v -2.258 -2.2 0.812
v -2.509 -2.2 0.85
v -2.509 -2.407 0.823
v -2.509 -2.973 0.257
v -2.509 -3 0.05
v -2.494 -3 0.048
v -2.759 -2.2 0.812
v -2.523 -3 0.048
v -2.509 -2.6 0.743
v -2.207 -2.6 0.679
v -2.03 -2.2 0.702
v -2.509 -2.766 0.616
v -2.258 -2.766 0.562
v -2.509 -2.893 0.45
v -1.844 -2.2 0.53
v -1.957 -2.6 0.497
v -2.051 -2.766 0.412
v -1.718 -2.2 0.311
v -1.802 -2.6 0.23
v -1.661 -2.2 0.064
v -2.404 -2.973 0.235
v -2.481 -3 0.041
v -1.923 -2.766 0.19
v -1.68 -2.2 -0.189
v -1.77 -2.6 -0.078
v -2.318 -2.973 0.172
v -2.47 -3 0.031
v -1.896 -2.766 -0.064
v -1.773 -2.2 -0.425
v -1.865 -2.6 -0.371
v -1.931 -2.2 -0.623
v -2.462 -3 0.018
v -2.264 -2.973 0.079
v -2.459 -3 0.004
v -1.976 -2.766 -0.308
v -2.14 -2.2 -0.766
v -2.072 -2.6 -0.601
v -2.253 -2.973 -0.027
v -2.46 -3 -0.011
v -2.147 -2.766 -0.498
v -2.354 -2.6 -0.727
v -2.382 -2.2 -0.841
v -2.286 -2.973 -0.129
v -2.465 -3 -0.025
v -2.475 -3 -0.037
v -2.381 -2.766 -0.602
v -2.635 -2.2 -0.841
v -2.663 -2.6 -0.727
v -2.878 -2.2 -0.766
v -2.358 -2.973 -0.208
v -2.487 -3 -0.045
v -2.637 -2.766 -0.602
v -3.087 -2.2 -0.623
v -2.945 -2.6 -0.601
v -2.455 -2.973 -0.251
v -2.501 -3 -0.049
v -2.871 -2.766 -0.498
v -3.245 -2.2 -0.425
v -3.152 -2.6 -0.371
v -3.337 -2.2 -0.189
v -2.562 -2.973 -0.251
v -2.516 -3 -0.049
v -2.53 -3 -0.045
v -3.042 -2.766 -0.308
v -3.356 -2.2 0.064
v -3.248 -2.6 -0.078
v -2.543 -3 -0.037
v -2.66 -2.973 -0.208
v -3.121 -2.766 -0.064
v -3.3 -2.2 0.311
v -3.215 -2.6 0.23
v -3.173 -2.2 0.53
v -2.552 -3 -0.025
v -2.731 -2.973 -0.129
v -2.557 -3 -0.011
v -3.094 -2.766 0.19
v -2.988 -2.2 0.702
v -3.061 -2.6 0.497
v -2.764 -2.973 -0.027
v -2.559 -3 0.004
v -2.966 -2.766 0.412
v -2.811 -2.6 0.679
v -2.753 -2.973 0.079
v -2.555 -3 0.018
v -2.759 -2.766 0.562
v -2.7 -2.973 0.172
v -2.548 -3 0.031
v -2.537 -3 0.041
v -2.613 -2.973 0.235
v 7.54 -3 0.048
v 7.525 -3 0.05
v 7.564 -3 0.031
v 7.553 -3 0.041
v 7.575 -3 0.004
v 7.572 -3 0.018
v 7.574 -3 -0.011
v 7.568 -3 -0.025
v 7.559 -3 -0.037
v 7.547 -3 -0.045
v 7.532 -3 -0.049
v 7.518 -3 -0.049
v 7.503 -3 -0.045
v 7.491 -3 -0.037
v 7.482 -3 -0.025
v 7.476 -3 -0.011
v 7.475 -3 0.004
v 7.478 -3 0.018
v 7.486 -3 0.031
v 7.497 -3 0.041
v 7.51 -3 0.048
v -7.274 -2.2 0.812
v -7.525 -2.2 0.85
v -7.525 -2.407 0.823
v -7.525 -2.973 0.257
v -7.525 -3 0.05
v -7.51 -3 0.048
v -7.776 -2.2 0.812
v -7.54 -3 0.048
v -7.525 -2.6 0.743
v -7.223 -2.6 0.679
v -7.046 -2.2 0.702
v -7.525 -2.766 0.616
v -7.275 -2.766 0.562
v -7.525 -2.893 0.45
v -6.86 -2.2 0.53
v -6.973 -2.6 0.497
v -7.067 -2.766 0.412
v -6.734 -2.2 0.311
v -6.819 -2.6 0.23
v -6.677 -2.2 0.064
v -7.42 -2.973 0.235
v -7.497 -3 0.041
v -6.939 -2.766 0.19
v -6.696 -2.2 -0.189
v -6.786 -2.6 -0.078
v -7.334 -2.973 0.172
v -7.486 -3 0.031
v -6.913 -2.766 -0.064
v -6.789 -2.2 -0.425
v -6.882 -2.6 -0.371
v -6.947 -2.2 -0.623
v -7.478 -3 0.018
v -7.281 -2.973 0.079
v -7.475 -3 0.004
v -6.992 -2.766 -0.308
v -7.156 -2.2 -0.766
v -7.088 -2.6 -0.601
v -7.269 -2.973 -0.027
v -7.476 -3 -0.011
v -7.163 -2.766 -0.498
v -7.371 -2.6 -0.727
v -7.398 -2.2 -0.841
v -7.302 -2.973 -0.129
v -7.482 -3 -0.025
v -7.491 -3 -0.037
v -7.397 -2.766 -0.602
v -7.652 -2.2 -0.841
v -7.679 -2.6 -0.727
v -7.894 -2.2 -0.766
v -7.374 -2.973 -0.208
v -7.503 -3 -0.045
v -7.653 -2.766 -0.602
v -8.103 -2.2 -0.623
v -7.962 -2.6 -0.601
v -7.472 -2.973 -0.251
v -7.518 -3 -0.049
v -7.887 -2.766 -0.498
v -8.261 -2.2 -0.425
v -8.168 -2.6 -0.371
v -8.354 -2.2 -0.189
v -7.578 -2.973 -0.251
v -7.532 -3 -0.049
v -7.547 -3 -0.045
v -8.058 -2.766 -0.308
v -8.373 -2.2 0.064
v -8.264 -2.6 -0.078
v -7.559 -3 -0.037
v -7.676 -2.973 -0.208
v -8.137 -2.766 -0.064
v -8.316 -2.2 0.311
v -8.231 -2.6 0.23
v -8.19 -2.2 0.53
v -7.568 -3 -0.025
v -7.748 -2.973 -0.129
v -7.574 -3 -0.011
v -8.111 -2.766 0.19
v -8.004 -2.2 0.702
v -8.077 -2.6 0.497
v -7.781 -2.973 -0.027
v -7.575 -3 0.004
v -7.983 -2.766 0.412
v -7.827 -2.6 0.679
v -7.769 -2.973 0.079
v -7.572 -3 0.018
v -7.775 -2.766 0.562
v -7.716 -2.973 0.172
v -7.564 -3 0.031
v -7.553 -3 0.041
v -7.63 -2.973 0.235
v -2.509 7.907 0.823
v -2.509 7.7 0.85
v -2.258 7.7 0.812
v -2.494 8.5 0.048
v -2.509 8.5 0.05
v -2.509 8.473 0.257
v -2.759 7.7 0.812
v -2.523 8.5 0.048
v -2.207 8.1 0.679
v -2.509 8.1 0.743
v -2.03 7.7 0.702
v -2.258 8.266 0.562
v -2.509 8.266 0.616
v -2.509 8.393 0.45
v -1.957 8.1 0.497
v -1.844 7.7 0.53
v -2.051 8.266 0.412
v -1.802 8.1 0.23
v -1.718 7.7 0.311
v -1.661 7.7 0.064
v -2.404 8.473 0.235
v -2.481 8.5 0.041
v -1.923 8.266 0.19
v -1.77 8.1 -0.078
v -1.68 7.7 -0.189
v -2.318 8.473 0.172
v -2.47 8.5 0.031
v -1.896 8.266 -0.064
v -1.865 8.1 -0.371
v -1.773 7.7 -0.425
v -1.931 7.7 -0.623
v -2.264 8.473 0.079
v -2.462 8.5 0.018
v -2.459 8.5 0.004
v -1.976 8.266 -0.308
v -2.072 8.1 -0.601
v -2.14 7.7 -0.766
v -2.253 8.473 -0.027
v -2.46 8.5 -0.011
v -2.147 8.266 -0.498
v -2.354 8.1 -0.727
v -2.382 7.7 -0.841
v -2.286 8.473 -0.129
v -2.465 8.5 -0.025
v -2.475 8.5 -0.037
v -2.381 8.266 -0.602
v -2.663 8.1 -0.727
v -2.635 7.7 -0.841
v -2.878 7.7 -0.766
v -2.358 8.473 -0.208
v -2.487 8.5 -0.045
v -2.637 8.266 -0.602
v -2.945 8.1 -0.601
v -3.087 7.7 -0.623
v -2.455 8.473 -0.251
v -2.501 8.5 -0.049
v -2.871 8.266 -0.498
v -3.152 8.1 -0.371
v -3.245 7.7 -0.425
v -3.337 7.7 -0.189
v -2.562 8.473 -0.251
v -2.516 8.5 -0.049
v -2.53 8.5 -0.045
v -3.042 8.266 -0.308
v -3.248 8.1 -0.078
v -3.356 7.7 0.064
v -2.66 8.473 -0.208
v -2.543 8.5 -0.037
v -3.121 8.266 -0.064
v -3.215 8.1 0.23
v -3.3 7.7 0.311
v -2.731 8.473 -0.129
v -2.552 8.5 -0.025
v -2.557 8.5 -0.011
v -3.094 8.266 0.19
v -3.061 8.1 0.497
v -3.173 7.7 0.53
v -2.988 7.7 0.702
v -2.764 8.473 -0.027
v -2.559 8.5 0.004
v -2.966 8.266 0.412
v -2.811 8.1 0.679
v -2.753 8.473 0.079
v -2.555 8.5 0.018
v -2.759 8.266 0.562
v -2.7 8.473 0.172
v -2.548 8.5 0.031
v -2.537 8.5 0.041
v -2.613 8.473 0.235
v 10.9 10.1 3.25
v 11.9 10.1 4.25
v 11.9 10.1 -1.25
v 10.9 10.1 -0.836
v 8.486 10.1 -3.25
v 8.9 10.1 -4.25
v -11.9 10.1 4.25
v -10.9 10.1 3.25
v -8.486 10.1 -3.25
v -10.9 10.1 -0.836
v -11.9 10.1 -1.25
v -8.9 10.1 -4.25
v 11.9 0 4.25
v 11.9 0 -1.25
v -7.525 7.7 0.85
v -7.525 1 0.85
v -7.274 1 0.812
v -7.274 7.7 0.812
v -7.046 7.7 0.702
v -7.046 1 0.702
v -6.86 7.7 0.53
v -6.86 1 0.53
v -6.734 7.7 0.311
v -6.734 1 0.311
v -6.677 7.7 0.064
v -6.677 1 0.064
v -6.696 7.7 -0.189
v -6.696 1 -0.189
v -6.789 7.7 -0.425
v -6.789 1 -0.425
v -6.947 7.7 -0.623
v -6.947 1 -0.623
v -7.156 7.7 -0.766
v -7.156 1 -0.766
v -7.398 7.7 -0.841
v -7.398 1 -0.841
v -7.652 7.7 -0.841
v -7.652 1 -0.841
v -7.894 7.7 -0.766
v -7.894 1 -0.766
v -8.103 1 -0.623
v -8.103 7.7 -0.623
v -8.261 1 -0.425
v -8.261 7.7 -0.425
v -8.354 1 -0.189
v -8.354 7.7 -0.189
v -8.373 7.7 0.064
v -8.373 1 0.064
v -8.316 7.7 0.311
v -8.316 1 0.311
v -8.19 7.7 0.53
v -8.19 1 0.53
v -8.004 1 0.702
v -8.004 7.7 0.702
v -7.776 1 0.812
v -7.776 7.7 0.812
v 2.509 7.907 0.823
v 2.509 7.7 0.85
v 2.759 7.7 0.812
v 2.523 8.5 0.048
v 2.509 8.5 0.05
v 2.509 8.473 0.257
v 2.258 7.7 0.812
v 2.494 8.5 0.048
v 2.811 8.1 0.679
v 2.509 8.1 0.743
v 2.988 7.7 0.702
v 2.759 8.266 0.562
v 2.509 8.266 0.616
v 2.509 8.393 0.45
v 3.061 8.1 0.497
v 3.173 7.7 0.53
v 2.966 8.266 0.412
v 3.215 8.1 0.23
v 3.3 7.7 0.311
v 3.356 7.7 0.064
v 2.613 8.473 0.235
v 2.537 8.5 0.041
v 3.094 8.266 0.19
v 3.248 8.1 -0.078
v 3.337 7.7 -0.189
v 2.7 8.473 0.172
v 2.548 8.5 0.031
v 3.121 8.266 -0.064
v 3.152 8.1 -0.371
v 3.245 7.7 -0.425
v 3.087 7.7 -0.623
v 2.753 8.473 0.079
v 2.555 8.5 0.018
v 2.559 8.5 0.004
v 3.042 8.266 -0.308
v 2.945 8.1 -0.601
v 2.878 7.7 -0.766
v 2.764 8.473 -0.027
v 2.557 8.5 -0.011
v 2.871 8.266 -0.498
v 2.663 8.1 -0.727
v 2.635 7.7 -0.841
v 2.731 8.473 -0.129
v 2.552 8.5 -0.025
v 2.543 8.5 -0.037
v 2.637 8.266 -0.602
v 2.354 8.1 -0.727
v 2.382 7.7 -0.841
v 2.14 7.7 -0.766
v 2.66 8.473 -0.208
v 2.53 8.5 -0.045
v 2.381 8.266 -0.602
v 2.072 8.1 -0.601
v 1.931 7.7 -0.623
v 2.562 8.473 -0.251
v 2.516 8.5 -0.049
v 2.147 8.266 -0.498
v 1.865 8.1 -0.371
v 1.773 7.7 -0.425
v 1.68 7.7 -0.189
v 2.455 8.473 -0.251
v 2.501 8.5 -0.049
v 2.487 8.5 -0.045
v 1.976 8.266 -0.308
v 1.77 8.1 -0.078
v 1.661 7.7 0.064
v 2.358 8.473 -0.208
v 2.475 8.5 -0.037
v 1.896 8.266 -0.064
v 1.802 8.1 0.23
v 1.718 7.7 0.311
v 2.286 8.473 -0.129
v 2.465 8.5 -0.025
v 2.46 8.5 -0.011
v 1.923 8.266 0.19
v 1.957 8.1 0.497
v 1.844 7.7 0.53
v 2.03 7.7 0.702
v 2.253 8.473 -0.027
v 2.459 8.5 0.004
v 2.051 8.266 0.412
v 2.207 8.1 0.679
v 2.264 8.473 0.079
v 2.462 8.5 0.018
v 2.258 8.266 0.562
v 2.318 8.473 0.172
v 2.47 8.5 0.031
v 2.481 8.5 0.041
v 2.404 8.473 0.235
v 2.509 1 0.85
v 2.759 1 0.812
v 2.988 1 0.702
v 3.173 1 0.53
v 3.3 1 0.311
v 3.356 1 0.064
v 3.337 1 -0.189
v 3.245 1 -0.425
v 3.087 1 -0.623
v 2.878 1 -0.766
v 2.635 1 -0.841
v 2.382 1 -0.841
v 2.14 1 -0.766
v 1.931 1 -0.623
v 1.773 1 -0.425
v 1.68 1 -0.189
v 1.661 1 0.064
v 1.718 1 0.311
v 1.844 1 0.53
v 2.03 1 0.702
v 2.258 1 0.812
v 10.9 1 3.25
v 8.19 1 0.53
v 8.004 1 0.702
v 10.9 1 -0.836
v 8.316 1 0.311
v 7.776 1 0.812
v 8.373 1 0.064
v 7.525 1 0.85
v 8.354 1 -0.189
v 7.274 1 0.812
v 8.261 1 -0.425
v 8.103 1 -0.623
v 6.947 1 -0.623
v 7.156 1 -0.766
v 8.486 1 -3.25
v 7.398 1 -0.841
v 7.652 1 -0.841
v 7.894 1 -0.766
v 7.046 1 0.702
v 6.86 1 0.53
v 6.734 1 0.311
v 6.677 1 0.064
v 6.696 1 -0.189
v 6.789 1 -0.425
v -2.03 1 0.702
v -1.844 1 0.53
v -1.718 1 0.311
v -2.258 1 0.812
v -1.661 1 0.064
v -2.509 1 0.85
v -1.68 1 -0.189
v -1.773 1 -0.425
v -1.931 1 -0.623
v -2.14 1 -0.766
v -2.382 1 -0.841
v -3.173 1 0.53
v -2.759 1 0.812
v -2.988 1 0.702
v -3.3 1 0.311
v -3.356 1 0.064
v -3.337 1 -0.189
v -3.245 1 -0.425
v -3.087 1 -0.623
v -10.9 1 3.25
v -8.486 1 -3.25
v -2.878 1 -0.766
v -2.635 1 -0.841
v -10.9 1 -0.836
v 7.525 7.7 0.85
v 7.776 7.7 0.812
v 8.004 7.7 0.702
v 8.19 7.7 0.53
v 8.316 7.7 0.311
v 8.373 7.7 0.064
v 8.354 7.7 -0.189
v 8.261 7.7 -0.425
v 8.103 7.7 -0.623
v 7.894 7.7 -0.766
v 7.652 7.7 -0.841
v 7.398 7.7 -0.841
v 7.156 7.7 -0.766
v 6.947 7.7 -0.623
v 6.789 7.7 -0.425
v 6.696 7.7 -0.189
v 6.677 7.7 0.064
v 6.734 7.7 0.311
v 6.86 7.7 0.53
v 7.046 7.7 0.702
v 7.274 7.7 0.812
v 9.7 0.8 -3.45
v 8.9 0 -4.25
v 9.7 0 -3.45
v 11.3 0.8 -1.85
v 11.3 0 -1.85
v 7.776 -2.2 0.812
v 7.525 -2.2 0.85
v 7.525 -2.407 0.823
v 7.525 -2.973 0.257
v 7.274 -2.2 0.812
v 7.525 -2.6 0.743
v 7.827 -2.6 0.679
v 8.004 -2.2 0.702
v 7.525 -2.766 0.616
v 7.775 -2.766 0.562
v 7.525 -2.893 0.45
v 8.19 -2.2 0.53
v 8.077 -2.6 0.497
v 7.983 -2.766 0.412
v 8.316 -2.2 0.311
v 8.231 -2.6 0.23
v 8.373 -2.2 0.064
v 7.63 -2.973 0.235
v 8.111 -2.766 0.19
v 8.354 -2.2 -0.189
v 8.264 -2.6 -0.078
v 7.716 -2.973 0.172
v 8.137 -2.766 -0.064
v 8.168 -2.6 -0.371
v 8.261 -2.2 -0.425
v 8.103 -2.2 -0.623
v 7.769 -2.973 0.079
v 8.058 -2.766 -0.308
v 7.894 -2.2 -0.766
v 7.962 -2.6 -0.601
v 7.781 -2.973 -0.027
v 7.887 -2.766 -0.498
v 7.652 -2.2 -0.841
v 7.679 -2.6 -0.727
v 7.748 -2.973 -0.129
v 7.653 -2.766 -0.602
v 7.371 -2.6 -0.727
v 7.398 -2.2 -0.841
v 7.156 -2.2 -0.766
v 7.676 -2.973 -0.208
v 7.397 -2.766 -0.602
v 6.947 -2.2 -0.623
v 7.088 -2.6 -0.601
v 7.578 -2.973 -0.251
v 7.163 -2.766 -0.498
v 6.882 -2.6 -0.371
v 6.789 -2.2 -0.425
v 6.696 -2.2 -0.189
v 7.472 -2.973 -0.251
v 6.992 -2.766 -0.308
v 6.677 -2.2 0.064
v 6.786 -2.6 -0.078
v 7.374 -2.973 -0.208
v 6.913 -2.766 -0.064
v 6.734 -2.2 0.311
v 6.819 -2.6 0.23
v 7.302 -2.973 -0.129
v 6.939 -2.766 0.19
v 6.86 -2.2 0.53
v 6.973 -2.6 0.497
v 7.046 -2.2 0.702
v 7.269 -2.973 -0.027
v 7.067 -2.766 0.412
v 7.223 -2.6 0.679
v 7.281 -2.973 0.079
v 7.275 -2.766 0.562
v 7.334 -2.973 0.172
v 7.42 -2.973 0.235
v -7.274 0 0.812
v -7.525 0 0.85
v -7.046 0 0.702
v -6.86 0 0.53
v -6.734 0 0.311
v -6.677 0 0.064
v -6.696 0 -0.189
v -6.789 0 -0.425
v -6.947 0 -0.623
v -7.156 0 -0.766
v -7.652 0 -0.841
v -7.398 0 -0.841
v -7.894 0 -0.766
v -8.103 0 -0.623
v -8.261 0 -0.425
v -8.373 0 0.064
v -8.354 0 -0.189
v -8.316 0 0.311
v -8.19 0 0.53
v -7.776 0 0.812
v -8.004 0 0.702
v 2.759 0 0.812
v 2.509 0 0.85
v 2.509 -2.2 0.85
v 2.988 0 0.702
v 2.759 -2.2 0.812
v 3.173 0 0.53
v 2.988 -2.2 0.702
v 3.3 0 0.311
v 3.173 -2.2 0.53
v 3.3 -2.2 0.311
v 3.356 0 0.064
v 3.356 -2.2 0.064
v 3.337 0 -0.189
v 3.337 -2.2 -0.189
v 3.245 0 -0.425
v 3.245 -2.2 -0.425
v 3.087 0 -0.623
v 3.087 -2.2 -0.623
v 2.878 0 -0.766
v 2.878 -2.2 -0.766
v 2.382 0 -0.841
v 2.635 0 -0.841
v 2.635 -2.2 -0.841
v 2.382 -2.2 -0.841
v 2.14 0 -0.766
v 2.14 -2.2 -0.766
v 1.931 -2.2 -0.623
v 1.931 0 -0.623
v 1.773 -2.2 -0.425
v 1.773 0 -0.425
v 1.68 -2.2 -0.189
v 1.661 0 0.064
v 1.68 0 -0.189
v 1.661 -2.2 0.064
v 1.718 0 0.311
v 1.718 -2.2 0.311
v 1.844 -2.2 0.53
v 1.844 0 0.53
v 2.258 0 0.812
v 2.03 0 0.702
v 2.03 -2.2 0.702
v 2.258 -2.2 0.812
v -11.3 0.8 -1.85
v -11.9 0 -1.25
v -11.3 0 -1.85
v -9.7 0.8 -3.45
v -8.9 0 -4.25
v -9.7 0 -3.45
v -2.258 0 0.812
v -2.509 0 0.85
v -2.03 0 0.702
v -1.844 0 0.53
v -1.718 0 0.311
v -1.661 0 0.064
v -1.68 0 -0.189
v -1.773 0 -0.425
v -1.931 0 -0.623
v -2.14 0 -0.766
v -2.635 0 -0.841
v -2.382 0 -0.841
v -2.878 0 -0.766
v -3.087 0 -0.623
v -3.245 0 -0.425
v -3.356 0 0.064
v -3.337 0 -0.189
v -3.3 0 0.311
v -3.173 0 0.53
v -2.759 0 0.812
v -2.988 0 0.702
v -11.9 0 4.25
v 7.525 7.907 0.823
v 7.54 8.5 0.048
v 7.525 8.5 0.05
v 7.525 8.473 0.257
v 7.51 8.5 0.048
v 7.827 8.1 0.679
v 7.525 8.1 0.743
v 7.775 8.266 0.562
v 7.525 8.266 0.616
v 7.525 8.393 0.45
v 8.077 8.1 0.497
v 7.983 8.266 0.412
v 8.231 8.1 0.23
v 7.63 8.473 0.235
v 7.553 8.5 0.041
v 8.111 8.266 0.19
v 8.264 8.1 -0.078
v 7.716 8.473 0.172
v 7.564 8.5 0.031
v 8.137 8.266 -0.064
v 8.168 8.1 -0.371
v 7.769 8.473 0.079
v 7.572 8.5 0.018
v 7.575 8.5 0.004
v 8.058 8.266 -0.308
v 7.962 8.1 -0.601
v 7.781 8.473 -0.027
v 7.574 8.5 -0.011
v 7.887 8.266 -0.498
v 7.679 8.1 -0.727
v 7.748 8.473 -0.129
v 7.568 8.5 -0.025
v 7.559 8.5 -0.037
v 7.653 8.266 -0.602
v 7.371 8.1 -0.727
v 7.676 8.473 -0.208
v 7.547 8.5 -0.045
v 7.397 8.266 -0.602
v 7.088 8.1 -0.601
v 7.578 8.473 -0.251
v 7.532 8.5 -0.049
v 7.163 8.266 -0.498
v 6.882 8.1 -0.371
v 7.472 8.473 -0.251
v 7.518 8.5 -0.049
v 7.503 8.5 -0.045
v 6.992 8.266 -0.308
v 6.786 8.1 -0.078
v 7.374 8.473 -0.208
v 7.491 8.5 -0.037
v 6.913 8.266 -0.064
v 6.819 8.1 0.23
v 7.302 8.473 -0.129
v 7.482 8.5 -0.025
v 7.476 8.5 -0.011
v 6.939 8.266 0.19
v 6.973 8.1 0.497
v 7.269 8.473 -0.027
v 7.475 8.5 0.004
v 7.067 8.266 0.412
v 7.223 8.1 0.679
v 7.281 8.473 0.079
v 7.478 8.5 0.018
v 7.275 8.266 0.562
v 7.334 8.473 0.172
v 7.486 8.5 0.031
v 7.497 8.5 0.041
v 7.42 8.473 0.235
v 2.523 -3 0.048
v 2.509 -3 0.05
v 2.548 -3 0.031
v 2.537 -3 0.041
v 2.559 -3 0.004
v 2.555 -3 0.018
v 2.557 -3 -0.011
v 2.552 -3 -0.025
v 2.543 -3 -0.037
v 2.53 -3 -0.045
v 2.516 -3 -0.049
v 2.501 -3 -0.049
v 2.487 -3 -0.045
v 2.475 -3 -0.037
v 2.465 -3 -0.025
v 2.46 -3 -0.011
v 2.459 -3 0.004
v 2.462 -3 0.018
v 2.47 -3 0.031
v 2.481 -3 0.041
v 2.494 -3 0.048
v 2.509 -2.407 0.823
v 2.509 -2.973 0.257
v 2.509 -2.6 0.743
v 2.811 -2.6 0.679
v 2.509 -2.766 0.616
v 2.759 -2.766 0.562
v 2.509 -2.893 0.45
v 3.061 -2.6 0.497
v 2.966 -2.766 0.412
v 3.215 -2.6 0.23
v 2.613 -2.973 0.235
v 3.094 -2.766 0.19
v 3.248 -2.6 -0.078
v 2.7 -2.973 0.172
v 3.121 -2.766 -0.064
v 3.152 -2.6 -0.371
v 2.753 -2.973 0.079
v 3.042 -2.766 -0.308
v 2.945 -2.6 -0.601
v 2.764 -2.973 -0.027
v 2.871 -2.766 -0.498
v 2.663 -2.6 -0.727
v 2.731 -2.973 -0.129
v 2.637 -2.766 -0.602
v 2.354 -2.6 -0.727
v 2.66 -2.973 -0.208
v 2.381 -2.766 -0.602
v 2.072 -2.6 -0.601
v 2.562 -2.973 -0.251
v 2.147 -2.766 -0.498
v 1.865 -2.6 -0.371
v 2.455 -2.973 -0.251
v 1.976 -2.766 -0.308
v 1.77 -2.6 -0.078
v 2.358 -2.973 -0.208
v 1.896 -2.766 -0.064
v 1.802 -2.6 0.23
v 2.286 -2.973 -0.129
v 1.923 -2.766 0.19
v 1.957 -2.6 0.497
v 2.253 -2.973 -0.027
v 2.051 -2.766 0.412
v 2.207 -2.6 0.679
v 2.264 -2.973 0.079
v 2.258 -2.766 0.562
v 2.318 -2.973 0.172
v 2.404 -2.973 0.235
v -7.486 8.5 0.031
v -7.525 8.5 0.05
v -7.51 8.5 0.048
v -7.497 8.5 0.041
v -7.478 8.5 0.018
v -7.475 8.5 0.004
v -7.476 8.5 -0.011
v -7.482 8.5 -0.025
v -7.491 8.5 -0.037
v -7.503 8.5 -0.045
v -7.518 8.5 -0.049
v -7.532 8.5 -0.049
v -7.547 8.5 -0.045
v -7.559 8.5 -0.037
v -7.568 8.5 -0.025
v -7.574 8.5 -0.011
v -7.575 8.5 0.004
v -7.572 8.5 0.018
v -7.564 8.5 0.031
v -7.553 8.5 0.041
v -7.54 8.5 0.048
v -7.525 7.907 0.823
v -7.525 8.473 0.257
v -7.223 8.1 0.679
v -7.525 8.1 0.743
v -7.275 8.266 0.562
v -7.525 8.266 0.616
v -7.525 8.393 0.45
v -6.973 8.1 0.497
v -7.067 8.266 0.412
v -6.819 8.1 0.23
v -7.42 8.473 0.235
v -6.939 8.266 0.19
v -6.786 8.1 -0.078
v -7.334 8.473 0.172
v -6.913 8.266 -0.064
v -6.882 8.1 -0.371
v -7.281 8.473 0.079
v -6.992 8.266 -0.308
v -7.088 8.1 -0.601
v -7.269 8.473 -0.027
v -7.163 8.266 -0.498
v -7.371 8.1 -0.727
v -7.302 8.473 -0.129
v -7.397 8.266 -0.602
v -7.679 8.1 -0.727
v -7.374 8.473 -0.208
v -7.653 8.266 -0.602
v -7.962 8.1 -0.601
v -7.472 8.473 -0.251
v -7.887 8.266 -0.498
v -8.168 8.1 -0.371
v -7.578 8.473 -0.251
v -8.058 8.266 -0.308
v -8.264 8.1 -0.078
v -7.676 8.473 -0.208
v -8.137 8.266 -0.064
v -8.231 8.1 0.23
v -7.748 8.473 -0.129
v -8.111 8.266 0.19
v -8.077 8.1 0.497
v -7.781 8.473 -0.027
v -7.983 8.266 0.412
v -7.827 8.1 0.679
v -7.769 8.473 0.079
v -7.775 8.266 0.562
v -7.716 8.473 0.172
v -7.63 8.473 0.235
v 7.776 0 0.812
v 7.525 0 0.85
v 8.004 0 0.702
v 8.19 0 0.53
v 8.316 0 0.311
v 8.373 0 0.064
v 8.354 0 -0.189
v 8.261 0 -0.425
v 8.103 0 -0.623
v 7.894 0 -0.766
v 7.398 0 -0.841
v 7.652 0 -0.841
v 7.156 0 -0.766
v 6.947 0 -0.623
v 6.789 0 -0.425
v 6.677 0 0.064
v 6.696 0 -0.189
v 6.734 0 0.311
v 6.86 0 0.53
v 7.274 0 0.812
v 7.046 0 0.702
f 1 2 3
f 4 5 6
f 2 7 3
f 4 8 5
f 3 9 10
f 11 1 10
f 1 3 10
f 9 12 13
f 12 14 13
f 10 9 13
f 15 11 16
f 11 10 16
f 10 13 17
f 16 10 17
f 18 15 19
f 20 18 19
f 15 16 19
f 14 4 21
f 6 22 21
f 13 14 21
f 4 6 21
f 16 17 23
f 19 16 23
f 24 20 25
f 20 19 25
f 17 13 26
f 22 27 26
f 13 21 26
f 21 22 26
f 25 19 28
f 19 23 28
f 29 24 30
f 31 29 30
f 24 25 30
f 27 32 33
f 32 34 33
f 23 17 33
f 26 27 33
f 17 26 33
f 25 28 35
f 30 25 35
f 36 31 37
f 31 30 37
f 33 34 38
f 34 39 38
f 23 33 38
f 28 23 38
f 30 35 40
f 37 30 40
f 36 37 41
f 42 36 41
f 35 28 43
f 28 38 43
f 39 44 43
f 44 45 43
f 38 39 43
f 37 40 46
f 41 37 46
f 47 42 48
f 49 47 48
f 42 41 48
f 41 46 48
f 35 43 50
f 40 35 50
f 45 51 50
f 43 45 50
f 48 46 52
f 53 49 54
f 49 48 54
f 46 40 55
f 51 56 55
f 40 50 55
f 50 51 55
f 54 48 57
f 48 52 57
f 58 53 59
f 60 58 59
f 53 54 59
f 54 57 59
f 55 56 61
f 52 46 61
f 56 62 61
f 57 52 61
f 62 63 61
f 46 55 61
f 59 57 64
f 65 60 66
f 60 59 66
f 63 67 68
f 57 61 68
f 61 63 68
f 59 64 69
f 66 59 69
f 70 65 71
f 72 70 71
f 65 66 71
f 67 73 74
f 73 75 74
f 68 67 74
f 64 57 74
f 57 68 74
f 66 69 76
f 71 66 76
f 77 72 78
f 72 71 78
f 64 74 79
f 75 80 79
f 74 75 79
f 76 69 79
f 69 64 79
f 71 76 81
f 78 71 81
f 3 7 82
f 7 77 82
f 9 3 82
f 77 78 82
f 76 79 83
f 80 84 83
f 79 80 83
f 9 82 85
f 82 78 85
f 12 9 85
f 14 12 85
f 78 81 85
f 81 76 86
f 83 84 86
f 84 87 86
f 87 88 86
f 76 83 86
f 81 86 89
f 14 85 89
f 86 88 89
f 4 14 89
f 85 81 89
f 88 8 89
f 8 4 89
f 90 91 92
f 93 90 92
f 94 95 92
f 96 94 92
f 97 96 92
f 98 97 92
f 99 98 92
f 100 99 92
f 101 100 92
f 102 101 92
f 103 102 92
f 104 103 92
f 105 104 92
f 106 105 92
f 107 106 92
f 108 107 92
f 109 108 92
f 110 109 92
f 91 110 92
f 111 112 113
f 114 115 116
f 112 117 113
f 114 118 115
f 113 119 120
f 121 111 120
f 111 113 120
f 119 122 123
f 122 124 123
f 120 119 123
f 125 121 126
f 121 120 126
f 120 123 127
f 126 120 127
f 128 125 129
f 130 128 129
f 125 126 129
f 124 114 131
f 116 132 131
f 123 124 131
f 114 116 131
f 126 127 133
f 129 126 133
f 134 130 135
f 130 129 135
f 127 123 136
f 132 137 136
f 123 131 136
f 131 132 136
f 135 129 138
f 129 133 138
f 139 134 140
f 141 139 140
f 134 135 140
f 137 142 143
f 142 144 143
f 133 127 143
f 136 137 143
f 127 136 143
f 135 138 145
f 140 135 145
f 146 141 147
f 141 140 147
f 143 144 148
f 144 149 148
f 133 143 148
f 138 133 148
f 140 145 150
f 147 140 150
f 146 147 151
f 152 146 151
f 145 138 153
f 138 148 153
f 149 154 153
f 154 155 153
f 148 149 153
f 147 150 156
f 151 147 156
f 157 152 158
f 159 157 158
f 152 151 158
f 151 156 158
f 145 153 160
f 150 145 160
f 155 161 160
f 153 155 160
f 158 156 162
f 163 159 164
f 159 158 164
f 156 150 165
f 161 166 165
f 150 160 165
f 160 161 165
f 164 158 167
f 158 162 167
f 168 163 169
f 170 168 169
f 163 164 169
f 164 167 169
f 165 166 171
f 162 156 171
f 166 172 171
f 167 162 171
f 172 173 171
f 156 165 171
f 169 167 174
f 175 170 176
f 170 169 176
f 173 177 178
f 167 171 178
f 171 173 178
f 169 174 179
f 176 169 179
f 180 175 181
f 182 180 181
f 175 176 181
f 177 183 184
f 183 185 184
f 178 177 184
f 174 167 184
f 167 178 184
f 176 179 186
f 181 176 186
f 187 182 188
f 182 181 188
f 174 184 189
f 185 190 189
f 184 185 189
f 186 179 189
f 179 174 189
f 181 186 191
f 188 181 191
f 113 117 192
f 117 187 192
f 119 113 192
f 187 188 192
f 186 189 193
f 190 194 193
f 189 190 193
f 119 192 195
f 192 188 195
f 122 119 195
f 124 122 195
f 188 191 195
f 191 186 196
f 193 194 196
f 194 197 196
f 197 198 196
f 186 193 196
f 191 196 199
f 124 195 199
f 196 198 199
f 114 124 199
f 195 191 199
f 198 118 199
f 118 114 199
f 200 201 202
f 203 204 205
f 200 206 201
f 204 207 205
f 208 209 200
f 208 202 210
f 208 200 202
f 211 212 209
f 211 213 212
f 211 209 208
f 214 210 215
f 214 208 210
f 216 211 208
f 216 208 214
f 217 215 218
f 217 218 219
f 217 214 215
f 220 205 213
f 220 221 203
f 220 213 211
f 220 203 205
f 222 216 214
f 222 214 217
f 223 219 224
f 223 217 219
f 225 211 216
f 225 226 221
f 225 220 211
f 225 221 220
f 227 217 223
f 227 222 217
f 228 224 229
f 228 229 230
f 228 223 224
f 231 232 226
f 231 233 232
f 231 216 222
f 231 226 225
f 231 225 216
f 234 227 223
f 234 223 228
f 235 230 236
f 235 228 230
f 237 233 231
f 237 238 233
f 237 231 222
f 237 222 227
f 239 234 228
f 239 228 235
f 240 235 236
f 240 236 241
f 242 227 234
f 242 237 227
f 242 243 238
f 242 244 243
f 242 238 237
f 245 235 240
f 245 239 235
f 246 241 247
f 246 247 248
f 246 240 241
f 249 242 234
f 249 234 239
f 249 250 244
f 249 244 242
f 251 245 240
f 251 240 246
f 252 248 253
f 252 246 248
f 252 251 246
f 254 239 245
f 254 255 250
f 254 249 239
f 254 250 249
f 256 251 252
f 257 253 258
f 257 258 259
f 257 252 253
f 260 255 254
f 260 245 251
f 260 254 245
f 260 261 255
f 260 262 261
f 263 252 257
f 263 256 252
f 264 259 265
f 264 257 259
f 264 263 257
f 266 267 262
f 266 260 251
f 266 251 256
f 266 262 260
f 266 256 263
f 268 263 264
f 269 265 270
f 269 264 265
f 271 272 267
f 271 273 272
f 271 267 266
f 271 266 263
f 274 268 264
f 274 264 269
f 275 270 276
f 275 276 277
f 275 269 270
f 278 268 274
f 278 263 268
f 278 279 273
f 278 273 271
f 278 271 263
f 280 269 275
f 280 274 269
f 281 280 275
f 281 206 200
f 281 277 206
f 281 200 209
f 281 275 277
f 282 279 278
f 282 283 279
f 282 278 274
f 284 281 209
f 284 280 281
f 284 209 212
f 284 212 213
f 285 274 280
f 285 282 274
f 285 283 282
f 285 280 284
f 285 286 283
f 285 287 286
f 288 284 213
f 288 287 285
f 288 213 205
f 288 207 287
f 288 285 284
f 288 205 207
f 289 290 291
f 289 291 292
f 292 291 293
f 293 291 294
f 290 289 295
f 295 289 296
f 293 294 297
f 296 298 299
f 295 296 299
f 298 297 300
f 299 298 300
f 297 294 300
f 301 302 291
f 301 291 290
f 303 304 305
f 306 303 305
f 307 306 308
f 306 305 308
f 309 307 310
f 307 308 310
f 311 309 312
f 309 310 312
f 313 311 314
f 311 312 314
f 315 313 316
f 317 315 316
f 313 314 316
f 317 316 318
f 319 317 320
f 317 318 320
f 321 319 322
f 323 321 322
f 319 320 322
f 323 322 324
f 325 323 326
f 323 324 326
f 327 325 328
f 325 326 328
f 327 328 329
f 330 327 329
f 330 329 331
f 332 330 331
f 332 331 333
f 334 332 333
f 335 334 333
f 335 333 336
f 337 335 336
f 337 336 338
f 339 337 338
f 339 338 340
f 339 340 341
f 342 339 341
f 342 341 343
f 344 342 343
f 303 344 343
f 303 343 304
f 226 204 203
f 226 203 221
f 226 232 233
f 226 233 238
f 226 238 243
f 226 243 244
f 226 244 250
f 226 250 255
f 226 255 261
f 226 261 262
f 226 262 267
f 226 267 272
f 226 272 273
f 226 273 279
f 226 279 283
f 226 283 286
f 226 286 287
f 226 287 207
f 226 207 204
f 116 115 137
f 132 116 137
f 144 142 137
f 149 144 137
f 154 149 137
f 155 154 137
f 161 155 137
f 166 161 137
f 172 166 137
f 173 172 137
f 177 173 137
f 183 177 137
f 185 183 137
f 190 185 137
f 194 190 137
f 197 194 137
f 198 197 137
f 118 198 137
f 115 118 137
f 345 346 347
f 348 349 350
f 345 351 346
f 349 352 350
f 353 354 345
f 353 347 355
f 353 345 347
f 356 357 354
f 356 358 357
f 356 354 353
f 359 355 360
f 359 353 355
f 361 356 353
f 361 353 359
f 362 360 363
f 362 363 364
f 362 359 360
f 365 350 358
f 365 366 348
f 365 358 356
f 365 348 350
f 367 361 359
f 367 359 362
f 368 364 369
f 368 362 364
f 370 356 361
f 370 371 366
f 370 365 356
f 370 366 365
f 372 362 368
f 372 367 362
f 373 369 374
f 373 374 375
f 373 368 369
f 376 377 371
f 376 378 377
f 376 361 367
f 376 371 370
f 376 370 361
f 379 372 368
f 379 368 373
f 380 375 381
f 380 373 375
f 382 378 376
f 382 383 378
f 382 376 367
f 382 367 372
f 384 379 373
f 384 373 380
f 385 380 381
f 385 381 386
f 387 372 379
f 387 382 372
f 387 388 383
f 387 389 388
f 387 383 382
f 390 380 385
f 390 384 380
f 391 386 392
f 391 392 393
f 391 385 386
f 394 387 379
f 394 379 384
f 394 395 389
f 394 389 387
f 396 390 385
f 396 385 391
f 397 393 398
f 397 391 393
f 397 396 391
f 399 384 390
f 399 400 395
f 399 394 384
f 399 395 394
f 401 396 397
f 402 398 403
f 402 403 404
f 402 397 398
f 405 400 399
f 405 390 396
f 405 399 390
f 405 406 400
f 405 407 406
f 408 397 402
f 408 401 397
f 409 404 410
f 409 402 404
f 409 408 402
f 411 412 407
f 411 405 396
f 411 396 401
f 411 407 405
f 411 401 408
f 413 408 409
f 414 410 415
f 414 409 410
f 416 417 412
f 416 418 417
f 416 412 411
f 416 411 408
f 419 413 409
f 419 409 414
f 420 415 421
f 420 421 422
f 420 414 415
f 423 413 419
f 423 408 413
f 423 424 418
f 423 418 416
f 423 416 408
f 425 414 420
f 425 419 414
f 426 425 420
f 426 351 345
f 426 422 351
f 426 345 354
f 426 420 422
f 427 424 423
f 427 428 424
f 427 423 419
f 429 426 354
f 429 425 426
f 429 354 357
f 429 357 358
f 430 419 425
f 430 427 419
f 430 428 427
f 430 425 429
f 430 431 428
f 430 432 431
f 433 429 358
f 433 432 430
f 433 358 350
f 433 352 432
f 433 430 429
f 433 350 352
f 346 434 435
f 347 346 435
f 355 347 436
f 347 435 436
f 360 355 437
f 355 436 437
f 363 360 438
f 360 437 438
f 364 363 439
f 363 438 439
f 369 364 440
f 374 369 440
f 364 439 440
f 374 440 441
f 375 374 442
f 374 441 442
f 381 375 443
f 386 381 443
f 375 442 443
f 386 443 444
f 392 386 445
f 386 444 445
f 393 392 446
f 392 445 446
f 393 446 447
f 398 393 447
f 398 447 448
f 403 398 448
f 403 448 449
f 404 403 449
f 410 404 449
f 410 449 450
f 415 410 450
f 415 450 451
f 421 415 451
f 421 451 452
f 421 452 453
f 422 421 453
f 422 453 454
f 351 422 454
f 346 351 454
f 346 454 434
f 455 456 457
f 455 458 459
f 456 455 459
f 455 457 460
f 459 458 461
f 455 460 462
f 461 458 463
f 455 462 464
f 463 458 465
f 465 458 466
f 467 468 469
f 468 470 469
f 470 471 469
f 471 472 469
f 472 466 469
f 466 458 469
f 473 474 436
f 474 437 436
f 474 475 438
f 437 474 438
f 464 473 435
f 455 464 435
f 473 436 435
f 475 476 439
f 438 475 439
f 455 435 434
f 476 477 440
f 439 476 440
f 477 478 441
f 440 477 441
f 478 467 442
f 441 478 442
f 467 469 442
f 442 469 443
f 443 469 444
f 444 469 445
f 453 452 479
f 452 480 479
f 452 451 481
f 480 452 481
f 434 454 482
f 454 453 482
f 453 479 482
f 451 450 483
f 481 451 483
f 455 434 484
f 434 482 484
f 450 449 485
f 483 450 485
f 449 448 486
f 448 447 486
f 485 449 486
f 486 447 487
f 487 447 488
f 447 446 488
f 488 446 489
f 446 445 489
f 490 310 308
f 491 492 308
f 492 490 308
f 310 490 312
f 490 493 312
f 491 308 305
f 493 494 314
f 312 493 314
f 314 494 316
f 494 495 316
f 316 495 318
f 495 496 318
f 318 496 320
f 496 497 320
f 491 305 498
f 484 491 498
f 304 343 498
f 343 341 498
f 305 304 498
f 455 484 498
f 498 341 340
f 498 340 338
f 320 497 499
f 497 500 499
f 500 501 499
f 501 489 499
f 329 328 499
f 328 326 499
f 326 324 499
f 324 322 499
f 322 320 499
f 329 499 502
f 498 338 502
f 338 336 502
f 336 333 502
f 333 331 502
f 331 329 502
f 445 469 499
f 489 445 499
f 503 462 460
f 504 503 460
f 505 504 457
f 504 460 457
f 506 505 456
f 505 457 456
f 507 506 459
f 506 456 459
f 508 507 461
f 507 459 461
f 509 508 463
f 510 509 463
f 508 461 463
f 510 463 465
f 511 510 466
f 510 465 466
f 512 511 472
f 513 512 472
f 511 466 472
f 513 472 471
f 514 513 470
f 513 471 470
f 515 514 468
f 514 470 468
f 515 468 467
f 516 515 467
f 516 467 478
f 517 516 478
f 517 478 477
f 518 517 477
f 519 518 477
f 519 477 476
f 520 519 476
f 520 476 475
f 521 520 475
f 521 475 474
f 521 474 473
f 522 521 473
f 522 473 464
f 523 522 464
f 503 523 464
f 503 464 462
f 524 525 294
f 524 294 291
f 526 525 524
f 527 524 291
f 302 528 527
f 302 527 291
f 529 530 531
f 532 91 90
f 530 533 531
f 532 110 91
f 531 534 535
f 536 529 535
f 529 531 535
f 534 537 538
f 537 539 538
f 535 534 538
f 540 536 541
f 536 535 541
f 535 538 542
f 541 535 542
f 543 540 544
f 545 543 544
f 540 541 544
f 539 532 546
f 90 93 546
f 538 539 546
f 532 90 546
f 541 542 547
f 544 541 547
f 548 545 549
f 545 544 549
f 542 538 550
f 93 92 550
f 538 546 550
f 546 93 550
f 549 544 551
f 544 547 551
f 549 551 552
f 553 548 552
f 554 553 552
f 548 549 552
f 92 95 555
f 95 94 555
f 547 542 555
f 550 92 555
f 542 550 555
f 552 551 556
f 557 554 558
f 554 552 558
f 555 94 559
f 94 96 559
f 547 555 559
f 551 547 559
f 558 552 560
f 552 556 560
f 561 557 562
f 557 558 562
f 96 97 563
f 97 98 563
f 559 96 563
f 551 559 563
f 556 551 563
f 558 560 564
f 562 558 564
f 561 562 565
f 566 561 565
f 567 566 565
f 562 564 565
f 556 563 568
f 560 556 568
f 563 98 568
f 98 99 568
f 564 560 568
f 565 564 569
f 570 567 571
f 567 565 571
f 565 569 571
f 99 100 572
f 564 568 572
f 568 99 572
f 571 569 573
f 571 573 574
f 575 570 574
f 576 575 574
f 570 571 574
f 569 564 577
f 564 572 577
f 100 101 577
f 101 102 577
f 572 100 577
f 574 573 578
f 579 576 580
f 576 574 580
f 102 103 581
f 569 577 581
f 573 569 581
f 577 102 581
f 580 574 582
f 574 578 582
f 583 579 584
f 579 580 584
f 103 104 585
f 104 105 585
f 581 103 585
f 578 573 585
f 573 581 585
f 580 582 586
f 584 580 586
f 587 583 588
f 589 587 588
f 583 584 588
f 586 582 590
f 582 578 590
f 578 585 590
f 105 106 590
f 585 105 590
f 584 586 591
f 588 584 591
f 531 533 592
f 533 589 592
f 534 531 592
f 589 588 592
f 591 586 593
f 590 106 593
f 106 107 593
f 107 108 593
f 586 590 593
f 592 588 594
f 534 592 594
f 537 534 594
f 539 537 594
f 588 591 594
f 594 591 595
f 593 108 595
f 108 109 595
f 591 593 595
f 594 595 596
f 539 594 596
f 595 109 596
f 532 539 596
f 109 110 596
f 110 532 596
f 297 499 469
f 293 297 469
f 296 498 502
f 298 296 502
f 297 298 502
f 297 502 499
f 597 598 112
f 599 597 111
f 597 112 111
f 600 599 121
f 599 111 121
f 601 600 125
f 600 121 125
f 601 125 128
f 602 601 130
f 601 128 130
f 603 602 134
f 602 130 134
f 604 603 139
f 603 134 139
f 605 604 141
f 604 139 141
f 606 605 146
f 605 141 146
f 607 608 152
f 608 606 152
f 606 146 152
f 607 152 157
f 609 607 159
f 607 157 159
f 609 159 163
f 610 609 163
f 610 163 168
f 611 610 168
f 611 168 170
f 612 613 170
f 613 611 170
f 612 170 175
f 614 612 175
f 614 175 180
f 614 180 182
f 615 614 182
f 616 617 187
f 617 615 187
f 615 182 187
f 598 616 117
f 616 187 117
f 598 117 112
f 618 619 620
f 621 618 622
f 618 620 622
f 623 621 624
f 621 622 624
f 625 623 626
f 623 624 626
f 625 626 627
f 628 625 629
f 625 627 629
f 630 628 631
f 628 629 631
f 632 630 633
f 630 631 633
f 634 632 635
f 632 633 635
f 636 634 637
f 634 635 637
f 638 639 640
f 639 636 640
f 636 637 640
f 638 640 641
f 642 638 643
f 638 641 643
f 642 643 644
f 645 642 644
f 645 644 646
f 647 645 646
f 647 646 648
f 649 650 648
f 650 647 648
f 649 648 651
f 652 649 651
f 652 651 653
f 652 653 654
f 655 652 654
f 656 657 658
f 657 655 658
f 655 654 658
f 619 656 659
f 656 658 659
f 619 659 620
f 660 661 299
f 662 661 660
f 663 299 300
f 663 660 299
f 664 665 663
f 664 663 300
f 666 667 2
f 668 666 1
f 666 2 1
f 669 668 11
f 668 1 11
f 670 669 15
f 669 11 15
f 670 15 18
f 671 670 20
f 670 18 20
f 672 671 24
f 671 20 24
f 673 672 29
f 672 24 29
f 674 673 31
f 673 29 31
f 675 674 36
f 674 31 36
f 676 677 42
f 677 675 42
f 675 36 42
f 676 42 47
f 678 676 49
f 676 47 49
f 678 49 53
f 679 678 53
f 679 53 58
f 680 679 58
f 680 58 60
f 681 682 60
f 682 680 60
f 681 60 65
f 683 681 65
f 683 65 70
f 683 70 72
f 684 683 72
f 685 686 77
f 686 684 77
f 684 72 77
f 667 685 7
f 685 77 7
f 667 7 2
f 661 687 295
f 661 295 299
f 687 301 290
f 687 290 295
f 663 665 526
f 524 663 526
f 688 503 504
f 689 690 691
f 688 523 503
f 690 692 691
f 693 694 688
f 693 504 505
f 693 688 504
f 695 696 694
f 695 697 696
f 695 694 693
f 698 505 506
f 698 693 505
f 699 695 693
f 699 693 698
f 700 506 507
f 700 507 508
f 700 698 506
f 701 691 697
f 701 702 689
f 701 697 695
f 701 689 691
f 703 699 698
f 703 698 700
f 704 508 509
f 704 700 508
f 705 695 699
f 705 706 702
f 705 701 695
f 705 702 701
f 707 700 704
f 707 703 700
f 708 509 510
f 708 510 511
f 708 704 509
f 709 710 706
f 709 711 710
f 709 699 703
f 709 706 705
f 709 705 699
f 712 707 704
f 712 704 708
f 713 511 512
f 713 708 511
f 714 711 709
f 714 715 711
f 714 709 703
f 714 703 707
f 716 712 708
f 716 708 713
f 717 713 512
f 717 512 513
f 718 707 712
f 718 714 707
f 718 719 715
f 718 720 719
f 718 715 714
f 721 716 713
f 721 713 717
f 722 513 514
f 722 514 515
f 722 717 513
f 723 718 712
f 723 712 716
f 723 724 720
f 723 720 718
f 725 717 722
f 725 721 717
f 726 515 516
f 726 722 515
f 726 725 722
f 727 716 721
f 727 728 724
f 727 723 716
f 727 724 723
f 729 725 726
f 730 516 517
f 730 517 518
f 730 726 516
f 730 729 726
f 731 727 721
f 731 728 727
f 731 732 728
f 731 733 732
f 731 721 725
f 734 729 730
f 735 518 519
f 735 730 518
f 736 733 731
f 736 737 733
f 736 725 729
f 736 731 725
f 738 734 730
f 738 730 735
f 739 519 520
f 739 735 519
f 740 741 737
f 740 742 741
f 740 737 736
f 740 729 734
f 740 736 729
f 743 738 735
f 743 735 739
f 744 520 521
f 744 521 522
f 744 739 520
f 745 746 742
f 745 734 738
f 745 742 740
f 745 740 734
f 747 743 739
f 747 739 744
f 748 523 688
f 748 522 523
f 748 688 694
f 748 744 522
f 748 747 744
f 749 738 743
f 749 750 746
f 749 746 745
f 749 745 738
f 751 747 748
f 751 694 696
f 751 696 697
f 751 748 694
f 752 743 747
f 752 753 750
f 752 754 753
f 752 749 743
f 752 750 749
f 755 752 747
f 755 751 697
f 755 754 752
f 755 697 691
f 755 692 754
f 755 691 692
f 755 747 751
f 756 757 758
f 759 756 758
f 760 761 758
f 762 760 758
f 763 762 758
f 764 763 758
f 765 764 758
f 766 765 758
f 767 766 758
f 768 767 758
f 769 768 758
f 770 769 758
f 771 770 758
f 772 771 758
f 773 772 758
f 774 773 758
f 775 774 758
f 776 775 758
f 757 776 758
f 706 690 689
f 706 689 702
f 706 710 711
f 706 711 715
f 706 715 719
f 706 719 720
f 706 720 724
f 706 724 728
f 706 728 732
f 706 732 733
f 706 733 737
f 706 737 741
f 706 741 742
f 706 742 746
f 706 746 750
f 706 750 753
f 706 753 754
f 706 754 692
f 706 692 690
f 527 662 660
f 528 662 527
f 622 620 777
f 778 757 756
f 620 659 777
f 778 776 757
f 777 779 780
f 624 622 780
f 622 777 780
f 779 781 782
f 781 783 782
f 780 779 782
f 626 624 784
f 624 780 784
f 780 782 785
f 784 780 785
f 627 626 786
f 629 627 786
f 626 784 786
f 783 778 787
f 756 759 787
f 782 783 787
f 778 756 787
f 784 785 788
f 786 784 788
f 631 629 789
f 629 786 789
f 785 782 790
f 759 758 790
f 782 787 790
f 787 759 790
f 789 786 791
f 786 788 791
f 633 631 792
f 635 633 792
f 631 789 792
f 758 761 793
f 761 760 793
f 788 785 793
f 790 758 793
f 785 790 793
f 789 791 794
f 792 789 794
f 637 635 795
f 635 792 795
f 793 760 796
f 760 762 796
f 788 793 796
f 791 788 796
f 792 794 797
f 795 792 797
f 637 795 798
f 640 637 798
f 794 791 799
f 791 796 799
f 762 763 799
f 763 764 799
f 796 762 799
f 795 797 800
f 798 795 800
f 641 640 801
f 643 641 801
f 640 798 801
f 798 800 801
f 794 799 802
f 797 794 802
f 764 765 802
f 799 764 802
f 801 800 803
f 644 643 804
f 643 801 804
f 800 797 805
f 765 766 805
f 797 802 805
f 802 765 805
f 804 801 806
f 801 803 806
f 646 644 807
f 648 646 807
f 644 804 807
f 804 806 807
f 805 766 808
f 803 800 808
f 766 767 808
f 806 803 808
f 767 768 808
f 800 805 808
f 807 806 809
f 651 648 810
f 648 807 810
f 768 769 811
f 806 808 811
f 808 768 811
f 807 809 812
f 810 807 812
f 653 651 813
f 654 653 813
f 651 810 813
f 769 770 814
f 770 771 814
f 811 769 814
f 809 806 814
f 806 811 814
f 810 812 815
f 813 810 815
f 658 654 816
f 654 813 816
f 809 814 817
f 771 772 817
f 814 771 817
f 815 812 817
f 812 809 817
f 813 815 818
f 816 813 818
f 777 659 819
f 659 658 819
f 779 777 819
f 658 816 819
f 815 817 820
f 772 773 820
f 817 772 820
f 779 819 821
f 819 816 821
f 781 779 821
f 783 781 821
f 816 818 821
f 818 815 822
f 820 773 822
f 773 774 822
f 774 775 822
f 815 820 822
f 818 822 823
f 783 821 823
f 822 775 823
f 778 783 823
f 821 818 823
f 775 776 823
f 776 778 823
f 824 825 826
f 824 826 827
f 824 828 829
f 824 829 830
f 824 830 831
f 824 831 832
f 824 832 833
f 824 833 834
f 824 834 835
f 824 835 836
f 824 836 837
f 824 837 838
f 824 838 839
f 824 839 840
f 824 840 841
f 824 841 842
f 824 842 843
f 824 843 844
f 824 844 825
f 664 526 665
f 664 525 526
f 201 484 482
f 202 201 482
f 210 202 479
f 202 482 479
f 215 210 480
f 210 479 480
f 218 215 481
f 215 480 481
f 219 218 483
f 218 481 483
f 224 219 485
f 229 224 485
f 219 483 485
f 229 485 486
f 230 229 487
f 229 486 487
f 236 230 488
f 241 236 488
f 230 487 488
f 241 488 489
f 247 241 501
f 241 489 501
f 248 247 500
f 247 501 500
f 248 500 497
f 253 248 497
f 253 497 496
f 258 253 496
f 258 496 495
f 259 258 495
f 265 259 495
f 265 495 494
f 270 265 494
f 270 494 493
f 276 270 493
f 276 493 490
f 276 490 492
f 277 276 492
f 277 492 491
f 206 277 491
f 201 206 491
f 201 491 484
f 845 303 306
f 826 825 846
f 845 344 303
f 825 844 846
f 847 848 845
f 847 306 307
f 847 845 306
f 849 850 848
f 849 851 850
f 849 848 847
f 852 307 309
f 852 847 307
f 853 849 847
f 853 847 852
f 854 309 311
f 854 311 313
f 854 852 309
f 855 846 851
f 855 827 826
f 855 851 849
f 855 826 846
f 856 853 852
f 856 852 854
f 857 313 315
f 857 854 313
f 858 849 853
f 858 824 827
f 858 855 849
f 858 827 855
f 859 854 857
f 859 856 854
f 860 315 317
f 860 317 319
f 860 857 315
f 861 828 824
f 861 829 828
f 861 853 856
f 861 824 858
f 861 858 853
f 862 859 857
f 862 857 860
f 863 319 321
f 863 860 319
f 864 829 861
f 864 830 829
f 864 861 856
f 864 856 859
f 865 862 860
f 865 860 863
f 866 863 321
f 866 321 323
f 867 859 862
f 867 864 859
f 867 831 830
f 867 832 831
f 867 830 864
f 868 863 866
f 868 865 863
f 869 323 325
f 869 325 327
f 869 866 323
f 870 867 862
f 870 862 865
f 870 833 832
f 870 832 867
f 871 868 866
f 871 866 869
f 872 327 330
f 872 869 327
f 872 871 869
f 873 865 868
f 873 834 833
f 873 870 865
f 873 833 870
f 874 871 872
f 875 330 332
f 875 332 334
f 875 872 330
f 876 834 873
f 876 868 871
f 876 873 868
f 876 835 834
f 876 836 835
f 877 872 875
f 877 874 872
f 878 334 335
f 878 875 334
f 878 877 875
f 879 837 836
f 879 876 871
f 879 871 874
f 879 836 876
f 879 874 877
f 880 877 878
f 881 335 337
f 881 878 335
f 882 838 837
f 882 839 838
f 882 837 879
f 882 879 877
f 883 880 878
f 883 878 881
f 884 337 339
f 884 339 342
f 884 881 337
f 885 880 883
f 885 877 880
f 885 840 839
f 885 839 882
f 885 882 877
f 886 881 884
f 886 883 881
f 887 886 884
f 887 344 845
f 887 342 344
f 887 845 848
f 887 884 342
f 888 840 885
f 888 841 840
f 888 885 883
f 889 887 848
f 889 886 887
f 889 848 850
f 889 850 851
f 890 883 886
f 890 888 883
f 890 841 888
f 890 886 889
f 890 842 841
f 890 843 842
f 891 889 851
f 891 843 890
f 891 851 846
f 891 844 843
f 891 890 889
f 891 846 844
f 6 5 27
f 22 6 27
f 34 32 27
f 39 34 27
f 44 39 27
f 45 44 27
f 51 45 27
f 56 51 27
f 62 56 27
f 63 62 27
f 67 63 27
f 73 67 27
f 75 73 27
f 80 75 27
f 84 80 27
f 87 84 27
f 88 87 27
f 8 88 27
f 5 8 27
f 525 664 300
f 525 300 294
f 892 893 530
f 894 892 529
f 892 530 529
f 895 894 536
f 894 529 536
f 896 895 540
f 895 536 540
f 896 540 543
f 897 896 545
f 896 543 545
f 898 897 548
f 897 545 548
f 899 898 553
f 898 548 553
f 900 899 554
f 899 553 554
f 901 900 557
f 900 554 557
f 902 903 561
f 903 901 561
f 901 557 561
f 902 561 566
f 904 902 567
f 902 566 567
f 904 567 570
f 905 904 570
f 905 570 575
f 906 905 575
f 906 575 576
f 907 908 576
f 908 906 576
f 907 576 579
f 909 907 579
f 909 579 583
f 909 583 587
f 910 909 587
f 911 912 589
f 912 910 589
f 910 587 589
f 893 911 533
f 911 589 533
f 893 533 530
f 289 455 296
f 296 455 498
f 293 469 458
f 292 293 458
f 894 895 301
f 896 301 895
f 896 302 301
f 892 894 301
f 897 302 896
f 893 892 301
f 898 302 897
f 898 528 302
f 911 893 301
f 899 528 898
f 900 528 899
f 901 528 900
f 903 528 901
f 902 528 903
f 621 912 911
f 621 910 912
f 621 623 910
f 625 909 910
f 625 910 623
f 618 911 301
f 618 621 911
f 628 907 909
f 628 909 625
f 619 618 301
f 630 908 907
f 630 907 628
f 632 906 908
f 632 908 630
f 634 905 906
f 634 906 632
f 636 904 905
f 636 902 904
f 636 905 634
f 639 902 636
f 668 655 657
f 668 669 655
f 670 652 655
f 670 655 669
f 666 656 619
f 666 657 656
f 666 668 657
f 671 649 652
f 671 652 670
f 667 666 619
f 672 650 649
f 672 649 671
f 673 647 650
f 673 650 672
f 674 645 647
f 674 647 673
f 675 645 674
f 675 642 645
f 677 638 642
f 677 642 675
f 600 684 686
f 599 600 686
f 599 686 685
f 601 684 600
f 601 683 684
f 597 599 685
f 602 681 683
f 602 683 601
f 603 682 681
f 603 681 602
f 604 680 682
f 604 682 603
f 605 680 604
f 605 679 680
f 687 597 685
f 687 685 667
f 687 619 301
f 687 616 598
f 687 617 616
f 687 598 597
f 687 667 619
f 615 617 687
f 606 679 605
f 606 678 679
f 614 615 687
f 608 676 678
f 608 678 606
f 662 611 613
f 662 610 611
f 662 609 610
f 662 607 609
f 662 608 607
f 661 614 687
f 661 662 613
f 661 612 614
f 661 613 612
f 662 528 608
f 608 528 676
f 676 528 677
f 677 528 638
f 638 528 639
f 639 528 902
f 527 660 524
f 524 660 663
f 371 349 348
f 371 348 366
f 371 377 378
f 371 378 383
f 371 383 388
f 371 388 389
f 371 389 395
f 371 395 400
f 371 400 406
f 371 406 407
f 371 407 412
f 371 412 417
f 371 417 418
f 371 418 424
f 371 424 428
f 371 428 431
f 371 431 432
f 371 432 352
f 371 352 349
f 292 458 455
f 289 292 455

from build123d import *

# Parameters (mm, degrees)
BOSS_EXTRUDE1_DEPTH      = 10.1
SHELL1_T                 = -1
BOSS_EXTRUDE2_DEPTH      = 7.5
BOSS_EXTRUDE2_DEPTH_BACK = 4
SKETCH3_R                = 0.85
FILLET2_R                = 0.8
SKETCH4_W                = 26.621777211
SKETCH4_H                = 1.6
CUT_EXTRUDE1_DEPTH       = 0.8


with BuildPart() as part:
    # Sketch2 → Boss-Extrude1 (new body)
    with BuildSketch(Plane(origin=(0, 0, 0), x_dir=(1, 0, 0), z_dir=(0, 1, 0))):
        Polygon((-11.9, 1.25), (-8.9, 4.25), (8.9, 4.25), (11.9, 1.25), (11.9, -4.25), (-11.9, -4.25), align=None)
    extrude(amount=BOSS_EXTRUDE1_DEPTH)

    # Shell1
    shell1_openings = [part.faces().sort_by_distance(p)[0] for p in [
        (0, 10.1, 0.151319193),
    ]]
    offset(amount=SHELL1_T, openings=shell1_openings, kind=Kind.INTERSECTION)

    # Sketch3 → Boss-Extrude2 (add, two sides: drawn at the far end of the back side and taken through both)
    with BuildSketch(Plane(origin=(0, 1, 0), x_dir=(1, 0, 0), z_dir=(0, 1, 0)).offset(-BOSS_EXTRUDE2_DEPTH_BACK)):
        with Locations(Location((-7.525, 0, 0), (0, 0, 270))):
            Circle(SKETCH3_R)
        with Locations(Location((-2.50875, 0, 0), (0, 0, 270))):
            Circle(SKETCH3_R)
        with Locations(Location((7.525, 0, 0), (0, 0, 270))):
            Circle(SKETCH3_R)
        with Locations(Location((2.50875, 0, 0), (0, 0, 270))):
            Circle(SKETCH3_R)
    extrude(amount=BOSS_EXTRUDE2_DEPTH + BOSS_EXTRUDE2_DEPTH_BACK)

    # Fillet2
    fillet2_edges = [part.edges().sort_by_distance(p)[0] for p in [
        (-7.525, -3, -0.85),
        (-7.525, 8.5, -0.85),
        (-2.50875, -3, -0.85),
        (-2.50875, 8.5, -0.85),
        (7.525, -3, -0.85),
        (7.525, 8.5, -0.85),
        (2.50875, -3, -0.85),
        (2.50875, 8.5, -0.85),
    ]]
    fillet(fillet2_edges, radius=FILLET2_R)

    # Sketch4 → Cut-Extrude1 (cut)
    with BuildSketch(Plane.XZ):
        with Locations((1.142747193, -2.65)):
            Rectangle(SKETCH4_W, SKETCH4_H)
    extrude(amount=-CUT_EXTRUDE1_DEPTH, mode=Mode.SUBTRACT)


solid = part.part
